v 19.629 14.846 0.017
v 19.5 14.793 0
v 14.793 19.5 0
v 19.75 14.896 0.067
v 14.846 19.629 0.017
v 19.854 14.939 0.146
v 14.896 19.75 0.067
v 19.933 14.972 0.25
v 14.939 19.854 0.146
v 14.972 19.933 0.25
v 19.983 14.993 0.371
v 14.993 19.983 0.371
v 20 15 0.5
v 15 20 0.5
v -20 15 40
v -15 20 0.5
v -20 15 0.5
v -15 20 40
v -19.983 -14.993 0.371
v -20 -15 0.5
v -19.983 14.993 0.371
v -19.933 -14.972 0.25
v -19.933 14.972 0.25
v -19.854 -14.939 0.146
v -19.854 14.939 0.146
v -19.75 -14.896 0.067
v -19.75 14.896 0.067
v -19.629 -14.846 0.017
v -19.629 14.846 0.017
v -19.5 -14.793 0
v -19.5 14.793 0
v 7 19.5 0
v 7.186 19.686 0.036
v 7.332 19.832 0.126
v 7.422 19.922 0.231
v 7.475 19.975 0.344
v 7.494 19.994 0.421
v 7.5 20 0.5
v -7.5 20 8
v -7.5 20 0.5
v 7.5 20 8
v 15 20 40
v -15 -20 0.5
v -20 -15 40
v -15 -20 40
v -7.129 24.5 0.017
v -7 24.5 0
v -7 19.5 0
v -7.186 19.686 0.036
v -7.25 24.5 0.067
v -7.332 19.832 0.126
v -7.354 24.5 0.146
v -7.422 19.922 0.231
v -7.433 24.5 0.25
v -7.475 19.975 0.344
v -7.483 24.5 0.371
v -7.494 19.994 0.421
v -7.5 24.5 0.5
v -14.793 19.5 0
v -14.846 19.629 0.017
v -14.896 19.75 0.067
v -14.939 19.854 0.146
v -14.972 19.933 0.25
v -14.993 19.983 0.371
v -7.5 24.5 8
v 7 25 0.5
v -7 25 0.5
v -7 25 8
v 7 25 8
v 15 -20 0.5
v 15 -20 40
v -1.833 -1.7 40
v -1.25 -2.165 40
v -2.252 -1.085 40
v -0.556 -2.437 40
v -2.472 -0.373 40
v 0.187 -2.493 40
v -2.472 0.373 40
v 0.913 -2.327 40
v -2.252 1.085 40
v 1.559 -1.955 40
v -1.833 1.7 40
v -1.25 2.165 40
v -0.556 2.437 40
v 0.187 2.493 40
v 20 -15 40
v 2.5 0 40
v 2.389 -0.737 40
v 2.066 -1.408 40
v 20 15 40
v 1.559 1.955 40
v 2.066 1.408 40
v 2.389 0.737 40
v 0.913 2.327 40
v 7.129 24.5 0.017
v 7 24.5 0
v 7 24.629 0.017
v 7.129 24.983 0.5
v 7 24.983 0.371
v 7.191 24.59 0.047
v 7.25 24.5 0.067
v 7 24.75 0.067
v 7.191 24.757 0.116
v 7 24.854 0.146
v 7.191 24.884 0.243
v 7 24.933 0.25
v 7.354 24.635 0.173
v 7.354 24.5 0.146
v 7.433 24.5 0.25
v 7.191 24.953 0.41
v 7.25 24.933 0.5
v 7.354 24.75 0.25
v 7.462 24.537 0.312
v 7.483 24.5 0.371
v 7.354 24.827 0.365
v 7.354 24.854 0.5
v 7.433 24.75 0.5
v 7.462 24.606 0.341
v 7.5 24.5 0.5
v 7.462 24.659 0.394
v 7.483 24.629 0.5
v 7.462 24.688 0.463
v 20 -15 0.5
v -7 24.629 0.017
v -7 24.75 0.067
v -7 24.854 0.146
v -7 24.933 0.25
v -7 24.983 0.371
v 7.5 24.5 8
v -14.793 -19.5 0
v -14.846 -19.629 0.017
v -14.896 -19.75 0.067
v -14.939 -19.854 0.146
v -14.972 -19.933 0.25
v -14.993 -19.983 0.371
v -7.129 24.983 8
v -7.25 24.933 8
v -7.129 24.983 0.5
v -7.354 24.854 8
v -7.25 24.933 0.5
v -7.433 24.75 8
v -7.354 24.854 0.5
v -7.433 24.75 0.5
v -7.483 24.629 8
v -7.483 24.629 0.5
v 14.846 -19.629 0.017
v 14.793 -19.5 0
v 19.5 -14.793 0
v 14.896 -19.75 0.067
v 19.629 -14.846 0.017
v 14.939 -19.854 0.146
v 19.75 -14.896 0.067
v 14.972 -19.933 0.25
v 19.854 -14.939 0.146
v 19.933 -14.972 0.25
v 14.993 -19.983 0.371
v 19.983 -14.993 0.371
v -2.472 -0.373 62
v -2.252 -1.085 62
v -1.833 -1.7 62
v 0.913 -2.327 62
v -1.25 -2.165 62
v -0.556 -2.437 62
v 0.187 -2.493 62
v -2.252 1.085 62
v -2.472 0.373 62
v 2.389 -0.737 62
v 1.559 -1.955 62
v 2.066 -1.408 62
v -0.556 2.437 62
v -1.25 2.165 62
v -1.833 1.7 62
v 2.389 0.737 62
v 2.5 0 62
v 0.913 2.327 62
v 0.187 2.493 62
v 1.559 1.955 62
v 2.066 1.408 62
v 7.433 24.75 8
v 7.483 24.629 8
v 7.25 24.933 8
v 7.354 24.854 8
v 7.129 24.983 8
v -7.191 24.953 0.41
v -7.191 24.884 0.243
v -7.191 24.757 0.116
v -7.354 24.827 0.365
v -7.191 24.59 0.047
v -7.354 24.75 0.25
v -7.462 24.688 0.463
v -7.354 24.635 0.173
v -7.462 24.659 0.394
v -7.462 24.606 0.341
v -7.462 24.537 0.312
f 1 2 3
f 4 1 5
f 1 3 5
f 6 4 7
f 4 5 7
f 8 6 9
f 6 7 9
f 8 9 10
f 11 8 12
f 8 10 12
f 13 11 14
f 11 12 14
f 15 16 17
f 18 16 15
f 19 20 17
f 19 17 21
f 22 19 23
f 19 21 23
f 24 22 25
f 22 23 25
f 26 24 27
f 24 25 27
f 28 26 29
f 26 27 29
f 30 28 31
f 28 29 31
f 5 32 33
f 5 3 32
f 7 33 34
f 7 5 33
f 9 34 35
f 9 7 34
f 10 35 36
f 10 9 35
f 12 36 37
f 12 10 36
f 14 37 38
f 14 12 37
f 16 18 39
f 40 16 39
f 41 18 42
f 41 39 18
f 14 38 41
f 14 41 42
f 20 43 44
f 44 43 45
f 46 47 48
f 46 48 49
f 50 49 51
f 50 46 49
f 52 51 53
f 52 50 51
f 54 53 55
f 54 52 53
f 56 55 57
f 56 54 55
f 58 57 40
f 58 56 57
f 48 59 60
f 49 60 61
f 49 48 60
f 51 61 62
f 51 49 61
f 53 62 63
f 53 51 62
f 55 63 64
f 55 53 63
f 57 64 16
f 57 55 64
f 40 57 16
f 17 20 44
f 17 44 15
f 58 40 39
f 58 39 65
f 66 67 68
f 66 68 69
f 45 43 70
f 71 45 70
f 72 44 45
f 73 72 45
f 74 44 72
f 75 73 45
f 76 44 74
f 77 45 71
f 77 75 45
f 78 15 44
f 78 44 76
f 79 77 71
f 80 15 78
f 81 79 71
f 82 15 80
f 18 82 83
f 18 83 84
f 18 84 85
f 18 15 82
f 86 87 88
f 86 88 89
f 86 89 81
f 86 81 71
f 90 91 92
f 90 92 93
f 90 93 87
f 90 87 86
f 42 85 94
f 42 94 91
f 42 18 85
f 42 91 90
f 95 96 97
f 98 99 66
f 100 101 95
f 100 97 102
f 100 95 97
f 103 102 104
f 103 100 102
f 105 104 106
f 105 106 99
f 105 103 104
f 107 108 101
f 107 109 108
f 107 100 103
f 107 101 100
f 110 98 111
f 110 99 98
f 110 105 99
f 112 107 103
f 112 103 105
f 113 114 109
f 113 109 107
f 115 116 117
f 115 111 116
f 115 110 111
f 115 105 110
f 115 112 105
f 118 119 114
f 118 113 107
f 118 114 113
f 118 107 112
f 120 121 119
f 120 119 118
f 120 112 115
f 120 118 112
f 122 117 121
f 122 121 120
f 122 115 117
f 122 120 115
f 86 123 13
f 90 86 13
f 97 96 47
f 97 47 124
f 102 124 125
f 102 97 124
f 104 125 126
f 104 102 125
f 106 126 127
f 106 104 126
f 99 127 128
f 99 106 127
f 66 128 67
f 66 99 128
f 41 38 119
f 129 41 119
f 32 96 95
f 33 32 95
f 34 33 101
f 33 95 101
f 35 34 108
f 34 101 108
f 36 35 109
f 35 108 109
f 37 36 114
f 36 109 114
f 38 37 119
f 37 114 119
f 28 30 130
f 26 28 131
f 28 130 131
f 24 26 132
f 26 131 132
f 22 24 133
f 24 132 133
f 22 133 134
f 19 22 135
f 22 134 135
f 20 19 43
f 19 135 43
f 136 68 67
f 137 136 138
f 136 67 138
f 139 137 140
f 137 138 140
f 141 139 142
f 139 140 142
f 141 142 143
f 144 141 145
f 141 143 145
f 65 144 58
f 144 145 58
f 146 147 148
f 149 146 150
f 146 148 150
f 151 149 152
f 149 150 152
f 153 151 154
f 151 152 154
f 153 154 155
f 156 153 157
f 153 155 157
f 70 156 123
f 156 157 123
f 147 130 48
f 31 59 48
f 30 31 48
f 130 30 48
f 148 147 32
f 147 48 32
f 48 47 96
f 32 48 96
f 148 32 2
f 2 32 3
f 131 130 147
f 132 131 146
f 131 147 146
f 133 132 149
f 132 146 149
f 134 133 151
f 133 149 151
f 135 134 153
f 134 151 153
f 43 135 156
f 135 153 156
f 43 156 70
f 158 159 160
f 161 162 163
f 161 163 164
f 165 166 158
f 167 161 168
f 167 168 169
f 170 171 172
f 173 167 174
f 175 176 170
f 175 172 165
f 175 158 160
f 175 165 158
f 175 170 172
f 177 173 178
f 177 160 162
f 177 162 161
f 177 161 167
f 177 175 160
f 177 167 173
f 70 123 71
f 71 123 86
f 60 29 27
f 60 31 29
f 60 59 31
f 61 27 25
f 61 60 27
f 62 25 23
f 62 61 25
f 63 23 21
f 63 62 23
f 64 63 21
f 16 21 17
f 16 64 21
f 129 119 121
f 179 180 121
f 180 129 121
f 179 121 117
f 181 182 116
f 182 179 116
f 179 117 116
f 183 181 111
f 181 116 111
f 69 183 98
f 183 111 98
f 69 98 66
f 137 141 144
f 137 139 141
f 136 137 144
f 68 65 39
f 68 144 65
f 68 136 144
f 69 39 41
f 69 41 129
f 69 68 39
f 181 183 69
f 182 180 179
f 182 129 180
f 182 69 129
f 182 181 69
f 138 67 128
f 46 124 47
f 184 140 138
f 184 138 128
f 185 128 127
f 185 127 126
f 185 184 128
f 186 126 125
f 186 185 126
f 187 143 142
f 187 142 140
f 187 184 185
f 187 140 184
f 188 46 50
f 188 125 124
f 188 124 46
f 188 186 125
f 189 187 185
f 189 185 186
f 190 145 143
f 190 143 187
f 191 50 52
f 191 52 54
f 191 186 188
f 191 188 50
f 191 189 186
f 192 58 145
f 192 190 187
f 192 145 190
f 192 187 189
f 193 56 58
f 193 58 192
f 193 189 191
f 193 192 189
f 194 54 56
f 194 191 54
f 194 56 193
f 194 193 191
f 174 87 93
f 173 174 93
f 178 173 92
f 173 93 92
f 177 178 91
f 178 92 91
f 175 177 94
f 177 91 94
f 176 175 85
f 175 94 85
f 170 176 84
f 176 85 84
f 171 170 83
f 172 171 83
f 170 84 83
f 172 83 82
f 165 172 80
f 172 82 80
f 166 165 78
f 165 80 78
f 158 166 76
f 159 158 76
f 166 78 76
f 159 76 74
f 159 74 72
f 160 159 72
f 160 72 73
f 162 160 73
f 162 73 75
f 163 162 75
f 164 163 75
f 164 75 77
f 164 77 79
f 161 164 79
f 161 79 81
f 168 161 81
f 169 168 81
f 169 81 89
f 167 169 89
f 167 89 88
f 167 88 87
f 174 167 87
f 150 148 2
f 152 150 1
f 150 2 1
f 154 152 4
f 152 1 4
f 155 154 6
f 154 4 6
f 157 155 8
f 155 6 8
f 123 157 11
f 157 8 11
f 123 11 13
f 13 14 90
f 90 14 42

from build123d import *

# Parameters (mm, degrees)
SKETCH1_W           = 40
SKETCH1_H           = 40
BOSS_EXTRUDE1_DEPTH = 40
CHAMFER1_SIZE       = 5
SKETCH2_W           = 15
SKETCH2_H           = 5
BOSS_EXTRUDE2_DEPTH = 8
FILLET1_R           = 0.5
FILLET2_R           = 0.5
SKETCH3_R           = 2.5
BOSS_EXTRUDE3_DEPTH = 62


with BuildPart() as part:
    # Sketch1 → Boss-Extrude1 (new body)
    with BuildSketch(Plane.XY):
        Rectangle(SKETCH1_W, SKETCH1_H)
    extrude(amount=BOSS_EXTRUDE1_DEPTH)

    # Chamfer1
    chamfer1_edges = [part.edges().sort_by_distance(p)[0] for p in [
        (-20, 20, 20),
        (20, 20, 20),
        (20, -20, 20),
        (-20, -20, 20),
    ]]
    chamfer(chamfer1_edges, length=CHAMFER1_SIZE)

    # Sketch2 → Boss-Extrude2 (add)
    with BuildSketch(Plane.XY):
        with Locations((0, 22.5)):
            Rectangle(SKETCH2_W, SKETCH2_H)
    extrude(amount=BOSS_EXTRUDE2_DEPTH)

    # Fillet1
    fillet1_edges = [part.edges().sort_by_distance(p)[0] for p in [
        (0, -20, 0),
        (-20, 0, 0),
        (11.25, 20, 0),
        (20, 0, 0),
        (17.5, 17.5, 0),
        (-17.5, 17.5, 0),
        (17.5, -17.5, 0),
        (-17.5, -17.5, 0),
        (-11.25, 20, 0),
        (-7.5, 22.5, 0),
        (7.5, 22.5, 0),
        (0, 25, 0),
    ]]
    fillet(fillet1_edges, radius=FILLET1_R)

    # Fillet2
    # the kernel refuses this fillet: 0.5 mm, written as the material it takes off along each edge
    with BuildSketch(Plane(origin=(-7, 24.5, 0.5), x_dir=(0, 1, 0), z_dir=(-1, 0, 0))) as fillet2_piece_1_section:
        Polygon((0, 0), (FILLET2_R, 0), (FILLET2_R, FILLET2_R), (0, FILLET2_R), align=None)
    fillet2_piece_1 = extrude(amount=FILLET2_R, mode=Mode.PRIVATE)
    fillet2_piece_1 = fillet2_piece_1 - Plane(origin=(-7, 24.5, 0.5), x_dir=(0, -0.7071067811865475, 0.7071067811865475), z_dir=(-1, 0, 0)) * Sphere(FILLET2_R, mode=Mode.PRIVATE)
    add(fillet2_piece_1, mode=Mode.SUBTRACT)
    with BuildSketch(Plane(origin=(7, 24.5, 0.5), x_dir=(0, 1, 0), z_dir=(1, 0, 0))) as fillet2_piece_2_section:
        Polygon((0, 0), (FILLET2_R, 0), (FILLET2_R, -FILLET2_R), (0, -FILLET2_R), align=None)
    fillet2_piece_2 = extrude(amount=FILLET2_R, mode=Mode.PRIVATE)
    fillet2_piece_2 = fillet2_piece_2 - Plane(origin=(7, 24.5, 0.5), x_dir=(0, -0.7071067811865475, 0.7071067811865475), z_dir=(1, 0, 0)) * Sphere(FILLET2_R, mode=Mode.PRIVATE)
    add(fillet2_piece_2, mode=Mode.SUBTRACT)
    with BuildSketch(Plane(origin=(-7.5, 25, 0.5), x_dir=(0, -1, 0), z_dir=(0, 0, 1))) as fillet2_piece_3:
        with BuildLine():
            CenterArc((FILLET2_R, FILLET2_R), FILLET2_R, 180, 90)
            Line((0, FILLET2_R), (0, 0))
            Line((0, 0), (FILLET2_R, 0))
        make_face()
    extrude(amount=8.75, mode=Mode.SUBTRACT)
    with BuildSketch(Plane(origin=(7.5, 25, 0.5), x_dir=(0, -1, 0), z_dir=(0, 0, 1))) as fillet2_piece_4:
        with BuildLine():
            CenterArc((FILLET2_R, -FILLET2_R), FILLET2_R, 90, 90)
            Line((0, -FILLET2_R), (0, 0))
            Line((0, 0), (FILLET2_R, 0))
        make_face()
    extrude(amount=8.75, mode=Mode.SUBTRACT)

    # Sketch3 → Boss-Extrude3 (add)
    with BuildSketch(Plane.XY):
        Circle(SKETCH3_R)
    extrude(amount=BOSS_EXTRUDE3_DEPTH)


solid = part.part
